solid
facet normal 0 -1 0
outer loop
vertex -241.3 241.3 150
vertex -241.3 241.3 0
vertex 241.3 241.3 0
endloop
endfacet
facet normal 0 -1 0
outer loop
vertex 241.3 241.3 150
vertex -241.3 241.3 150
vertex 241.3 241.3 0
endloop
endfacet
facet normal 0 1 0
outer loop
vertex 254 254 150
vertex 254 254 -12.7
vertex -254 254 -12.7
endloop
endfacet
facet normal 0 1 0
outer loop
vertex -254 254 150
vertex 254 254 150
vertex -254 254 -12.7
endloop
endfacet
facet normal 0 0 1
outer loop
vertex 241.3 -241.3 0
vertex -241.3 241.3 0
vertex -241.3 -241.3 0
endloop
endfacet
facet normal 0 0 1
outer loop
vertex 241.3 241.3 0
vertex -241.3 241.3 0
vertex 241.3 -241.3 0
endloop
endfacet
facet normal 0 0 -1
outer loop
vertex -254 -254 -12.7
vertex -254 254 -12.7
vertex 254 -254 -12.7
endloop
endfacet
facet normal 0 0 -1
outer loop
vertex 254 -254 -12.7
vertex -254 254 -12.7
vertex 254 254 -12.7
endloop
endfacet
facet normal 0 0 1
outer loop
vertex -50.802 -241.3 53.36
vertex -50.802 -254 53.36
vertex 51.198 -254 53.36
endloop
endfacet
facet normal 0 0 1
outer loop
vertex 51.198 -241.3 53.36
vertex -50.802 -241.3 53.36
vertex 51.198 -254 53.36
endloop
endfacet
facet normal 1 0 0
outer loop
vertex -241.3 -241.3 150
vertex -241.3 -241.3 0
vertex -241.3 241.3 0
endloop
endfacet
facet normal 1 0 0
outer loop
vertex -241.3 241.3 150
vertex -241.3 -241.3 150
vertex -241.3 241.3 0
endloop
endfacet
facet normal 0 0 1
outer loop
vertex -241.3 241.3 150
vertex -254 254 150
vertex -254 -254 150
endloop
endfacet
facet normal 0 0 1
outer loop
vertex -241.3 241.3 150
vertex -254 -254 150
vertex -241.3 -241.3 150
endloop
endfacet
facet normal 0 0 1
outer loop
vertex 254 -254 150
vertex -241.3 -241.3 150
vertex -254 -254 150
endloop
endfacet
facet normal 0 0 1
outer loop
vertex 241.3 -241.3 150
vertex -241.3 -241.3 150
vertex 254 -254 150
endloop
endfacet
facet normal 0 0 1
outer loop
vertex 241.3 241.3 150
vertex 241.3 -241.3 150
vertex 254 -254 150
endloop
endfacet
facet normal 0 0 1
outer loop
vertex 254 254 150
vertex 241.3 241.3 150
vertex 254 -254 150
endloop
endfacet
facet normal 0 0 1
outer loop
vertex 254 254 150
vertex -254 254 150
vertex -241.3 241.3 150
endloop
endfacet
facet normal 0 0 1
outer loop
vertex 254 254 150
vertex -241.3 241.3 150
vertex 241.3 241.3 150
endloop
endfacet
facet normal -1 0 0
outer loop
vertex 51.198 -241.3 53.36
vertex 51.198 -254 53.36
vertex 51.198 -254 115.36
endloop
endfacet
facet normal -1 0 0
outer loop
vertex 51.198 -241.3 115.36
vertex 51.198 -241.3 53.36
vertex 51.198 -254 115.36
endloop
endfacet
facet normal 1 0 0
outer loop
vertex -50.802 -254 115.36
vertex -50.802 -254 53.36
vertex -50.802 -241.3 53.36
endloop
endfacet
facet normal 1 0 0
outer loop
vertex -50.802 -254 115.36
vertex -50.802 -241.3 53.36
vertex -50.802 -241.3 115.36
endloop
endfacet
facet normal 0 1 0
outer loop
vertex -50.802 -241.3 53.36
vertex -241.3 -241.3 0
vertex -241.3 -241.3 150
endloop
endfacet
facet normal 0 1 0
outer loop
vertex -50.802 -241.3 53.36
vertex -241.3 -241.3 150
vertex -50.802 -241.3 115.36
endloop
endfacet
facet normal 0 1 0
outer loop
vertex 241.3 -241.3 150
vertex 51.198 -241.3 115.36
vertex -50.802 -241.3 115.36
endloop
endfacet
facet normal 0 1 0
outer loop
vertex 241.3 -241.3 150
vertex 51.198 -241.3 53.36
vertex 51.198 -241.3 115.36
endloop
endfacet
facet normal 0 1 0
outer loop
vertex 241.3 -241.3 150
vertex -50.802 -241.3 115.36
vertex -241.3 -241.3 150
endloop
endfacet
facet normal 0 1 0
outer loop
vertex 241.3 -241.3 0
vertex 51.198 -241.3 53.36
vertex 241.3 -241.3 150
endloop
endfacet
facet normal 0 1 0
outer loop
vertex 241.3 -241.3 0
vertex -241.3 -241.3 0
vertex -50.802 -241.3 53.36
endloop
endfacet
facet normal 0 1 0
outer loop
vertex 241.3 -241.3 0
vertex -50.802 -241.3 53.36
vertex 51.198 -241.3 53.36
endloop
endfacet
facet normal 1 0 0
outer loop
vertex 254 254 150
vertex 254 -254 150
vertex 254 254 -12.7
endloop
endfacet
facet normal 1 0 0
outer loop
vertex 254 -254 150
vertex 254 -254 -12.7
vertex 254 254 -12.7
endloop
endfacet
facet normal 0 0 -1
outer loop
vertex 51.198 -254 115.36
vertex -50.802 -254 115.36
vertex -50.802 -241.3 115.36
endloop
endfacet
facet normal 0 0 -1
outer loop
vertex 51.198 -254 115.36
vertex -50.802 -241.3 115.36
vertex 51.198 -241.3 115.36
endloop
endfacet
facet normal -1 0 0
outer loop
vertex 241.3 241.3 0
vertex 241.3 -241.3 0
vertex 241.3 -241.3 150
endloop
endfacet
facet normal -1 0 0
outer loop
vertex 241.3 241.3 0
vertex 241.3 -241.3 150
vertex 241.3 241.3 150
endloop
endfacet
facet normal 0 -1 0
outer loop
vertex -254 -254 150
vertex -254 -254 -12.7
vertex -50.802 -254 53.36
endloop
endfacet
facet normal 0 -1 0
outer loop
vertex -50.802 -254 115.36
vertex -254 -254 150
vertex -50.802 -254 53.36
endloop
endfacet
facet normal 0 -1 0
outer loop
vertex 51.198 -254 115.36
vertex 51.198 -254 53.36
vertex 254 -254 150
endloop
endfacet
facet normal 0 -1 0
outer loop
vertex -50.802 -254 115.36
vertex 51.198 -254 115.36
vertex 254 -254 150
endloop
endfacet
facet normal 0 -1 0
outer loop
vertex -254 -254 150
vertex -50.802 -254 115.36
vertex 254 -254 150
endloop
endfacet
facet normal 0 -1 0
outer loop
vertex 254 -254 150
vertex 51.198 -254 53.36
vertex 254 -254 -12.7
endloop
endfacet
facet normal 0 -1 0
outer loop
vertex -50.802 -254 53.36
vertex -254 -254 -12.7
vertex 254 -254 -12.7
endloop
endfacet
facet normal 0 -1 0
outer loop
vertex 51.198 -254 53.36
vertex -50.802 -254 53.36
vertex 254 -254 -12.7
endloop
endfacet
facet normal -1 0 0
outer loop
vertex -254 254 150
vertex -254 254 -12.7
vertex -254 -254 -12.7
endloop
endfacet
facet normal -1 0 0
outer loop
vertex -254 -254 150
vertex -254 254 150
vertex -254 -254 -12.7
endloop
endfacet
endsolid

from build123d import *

# Parameters (mm, degrees)
F0_W     = 508
F0_H     = 508
F1_DEPTH = 12.7
F2_W     = 482.6
F2_H     = 482.6
F3_DEPTH = 150
F4_W     = 102
F4_H     = 62
F5_DEPTH = 50.8


with BuildPart() as f1:
    # F0 (on Top) → F1 (new body)
    with BuildSketch(Plane.XY):
        Rectangle(F0_W, F0_H)
    extrude(amount=-F1_DEPTH)

    # F2 (on face) → F3 (join)
    with BuildSketch(Plane.XY):
        Polygon((-241.3, 254), (-254, 254), (-254, 241.3), (-254, -233.078346), (-254, -241.3), (-254, -254), (-241.3, -254), (241.3, -254), (254, -254), (254, -241.3), (254, 241.3), (254, 254), (241.3, 254), align=None)
        Rectangle(F2_W, F2_H, mode=Mode.SUBTRACT)
    extrude(amount=F3_DEPTH)

    # F4 (on face) → F5 (cut)
    with BuildSketch(Plane.XZ.offset(254)):
        with Locations((0.197696, 84.359624)):
            Rectangle(F4_W, F4_H)
    extrude(amount=-F5_DEPTH, mode=Mode.SUBTRACT)


solid = f1.part
